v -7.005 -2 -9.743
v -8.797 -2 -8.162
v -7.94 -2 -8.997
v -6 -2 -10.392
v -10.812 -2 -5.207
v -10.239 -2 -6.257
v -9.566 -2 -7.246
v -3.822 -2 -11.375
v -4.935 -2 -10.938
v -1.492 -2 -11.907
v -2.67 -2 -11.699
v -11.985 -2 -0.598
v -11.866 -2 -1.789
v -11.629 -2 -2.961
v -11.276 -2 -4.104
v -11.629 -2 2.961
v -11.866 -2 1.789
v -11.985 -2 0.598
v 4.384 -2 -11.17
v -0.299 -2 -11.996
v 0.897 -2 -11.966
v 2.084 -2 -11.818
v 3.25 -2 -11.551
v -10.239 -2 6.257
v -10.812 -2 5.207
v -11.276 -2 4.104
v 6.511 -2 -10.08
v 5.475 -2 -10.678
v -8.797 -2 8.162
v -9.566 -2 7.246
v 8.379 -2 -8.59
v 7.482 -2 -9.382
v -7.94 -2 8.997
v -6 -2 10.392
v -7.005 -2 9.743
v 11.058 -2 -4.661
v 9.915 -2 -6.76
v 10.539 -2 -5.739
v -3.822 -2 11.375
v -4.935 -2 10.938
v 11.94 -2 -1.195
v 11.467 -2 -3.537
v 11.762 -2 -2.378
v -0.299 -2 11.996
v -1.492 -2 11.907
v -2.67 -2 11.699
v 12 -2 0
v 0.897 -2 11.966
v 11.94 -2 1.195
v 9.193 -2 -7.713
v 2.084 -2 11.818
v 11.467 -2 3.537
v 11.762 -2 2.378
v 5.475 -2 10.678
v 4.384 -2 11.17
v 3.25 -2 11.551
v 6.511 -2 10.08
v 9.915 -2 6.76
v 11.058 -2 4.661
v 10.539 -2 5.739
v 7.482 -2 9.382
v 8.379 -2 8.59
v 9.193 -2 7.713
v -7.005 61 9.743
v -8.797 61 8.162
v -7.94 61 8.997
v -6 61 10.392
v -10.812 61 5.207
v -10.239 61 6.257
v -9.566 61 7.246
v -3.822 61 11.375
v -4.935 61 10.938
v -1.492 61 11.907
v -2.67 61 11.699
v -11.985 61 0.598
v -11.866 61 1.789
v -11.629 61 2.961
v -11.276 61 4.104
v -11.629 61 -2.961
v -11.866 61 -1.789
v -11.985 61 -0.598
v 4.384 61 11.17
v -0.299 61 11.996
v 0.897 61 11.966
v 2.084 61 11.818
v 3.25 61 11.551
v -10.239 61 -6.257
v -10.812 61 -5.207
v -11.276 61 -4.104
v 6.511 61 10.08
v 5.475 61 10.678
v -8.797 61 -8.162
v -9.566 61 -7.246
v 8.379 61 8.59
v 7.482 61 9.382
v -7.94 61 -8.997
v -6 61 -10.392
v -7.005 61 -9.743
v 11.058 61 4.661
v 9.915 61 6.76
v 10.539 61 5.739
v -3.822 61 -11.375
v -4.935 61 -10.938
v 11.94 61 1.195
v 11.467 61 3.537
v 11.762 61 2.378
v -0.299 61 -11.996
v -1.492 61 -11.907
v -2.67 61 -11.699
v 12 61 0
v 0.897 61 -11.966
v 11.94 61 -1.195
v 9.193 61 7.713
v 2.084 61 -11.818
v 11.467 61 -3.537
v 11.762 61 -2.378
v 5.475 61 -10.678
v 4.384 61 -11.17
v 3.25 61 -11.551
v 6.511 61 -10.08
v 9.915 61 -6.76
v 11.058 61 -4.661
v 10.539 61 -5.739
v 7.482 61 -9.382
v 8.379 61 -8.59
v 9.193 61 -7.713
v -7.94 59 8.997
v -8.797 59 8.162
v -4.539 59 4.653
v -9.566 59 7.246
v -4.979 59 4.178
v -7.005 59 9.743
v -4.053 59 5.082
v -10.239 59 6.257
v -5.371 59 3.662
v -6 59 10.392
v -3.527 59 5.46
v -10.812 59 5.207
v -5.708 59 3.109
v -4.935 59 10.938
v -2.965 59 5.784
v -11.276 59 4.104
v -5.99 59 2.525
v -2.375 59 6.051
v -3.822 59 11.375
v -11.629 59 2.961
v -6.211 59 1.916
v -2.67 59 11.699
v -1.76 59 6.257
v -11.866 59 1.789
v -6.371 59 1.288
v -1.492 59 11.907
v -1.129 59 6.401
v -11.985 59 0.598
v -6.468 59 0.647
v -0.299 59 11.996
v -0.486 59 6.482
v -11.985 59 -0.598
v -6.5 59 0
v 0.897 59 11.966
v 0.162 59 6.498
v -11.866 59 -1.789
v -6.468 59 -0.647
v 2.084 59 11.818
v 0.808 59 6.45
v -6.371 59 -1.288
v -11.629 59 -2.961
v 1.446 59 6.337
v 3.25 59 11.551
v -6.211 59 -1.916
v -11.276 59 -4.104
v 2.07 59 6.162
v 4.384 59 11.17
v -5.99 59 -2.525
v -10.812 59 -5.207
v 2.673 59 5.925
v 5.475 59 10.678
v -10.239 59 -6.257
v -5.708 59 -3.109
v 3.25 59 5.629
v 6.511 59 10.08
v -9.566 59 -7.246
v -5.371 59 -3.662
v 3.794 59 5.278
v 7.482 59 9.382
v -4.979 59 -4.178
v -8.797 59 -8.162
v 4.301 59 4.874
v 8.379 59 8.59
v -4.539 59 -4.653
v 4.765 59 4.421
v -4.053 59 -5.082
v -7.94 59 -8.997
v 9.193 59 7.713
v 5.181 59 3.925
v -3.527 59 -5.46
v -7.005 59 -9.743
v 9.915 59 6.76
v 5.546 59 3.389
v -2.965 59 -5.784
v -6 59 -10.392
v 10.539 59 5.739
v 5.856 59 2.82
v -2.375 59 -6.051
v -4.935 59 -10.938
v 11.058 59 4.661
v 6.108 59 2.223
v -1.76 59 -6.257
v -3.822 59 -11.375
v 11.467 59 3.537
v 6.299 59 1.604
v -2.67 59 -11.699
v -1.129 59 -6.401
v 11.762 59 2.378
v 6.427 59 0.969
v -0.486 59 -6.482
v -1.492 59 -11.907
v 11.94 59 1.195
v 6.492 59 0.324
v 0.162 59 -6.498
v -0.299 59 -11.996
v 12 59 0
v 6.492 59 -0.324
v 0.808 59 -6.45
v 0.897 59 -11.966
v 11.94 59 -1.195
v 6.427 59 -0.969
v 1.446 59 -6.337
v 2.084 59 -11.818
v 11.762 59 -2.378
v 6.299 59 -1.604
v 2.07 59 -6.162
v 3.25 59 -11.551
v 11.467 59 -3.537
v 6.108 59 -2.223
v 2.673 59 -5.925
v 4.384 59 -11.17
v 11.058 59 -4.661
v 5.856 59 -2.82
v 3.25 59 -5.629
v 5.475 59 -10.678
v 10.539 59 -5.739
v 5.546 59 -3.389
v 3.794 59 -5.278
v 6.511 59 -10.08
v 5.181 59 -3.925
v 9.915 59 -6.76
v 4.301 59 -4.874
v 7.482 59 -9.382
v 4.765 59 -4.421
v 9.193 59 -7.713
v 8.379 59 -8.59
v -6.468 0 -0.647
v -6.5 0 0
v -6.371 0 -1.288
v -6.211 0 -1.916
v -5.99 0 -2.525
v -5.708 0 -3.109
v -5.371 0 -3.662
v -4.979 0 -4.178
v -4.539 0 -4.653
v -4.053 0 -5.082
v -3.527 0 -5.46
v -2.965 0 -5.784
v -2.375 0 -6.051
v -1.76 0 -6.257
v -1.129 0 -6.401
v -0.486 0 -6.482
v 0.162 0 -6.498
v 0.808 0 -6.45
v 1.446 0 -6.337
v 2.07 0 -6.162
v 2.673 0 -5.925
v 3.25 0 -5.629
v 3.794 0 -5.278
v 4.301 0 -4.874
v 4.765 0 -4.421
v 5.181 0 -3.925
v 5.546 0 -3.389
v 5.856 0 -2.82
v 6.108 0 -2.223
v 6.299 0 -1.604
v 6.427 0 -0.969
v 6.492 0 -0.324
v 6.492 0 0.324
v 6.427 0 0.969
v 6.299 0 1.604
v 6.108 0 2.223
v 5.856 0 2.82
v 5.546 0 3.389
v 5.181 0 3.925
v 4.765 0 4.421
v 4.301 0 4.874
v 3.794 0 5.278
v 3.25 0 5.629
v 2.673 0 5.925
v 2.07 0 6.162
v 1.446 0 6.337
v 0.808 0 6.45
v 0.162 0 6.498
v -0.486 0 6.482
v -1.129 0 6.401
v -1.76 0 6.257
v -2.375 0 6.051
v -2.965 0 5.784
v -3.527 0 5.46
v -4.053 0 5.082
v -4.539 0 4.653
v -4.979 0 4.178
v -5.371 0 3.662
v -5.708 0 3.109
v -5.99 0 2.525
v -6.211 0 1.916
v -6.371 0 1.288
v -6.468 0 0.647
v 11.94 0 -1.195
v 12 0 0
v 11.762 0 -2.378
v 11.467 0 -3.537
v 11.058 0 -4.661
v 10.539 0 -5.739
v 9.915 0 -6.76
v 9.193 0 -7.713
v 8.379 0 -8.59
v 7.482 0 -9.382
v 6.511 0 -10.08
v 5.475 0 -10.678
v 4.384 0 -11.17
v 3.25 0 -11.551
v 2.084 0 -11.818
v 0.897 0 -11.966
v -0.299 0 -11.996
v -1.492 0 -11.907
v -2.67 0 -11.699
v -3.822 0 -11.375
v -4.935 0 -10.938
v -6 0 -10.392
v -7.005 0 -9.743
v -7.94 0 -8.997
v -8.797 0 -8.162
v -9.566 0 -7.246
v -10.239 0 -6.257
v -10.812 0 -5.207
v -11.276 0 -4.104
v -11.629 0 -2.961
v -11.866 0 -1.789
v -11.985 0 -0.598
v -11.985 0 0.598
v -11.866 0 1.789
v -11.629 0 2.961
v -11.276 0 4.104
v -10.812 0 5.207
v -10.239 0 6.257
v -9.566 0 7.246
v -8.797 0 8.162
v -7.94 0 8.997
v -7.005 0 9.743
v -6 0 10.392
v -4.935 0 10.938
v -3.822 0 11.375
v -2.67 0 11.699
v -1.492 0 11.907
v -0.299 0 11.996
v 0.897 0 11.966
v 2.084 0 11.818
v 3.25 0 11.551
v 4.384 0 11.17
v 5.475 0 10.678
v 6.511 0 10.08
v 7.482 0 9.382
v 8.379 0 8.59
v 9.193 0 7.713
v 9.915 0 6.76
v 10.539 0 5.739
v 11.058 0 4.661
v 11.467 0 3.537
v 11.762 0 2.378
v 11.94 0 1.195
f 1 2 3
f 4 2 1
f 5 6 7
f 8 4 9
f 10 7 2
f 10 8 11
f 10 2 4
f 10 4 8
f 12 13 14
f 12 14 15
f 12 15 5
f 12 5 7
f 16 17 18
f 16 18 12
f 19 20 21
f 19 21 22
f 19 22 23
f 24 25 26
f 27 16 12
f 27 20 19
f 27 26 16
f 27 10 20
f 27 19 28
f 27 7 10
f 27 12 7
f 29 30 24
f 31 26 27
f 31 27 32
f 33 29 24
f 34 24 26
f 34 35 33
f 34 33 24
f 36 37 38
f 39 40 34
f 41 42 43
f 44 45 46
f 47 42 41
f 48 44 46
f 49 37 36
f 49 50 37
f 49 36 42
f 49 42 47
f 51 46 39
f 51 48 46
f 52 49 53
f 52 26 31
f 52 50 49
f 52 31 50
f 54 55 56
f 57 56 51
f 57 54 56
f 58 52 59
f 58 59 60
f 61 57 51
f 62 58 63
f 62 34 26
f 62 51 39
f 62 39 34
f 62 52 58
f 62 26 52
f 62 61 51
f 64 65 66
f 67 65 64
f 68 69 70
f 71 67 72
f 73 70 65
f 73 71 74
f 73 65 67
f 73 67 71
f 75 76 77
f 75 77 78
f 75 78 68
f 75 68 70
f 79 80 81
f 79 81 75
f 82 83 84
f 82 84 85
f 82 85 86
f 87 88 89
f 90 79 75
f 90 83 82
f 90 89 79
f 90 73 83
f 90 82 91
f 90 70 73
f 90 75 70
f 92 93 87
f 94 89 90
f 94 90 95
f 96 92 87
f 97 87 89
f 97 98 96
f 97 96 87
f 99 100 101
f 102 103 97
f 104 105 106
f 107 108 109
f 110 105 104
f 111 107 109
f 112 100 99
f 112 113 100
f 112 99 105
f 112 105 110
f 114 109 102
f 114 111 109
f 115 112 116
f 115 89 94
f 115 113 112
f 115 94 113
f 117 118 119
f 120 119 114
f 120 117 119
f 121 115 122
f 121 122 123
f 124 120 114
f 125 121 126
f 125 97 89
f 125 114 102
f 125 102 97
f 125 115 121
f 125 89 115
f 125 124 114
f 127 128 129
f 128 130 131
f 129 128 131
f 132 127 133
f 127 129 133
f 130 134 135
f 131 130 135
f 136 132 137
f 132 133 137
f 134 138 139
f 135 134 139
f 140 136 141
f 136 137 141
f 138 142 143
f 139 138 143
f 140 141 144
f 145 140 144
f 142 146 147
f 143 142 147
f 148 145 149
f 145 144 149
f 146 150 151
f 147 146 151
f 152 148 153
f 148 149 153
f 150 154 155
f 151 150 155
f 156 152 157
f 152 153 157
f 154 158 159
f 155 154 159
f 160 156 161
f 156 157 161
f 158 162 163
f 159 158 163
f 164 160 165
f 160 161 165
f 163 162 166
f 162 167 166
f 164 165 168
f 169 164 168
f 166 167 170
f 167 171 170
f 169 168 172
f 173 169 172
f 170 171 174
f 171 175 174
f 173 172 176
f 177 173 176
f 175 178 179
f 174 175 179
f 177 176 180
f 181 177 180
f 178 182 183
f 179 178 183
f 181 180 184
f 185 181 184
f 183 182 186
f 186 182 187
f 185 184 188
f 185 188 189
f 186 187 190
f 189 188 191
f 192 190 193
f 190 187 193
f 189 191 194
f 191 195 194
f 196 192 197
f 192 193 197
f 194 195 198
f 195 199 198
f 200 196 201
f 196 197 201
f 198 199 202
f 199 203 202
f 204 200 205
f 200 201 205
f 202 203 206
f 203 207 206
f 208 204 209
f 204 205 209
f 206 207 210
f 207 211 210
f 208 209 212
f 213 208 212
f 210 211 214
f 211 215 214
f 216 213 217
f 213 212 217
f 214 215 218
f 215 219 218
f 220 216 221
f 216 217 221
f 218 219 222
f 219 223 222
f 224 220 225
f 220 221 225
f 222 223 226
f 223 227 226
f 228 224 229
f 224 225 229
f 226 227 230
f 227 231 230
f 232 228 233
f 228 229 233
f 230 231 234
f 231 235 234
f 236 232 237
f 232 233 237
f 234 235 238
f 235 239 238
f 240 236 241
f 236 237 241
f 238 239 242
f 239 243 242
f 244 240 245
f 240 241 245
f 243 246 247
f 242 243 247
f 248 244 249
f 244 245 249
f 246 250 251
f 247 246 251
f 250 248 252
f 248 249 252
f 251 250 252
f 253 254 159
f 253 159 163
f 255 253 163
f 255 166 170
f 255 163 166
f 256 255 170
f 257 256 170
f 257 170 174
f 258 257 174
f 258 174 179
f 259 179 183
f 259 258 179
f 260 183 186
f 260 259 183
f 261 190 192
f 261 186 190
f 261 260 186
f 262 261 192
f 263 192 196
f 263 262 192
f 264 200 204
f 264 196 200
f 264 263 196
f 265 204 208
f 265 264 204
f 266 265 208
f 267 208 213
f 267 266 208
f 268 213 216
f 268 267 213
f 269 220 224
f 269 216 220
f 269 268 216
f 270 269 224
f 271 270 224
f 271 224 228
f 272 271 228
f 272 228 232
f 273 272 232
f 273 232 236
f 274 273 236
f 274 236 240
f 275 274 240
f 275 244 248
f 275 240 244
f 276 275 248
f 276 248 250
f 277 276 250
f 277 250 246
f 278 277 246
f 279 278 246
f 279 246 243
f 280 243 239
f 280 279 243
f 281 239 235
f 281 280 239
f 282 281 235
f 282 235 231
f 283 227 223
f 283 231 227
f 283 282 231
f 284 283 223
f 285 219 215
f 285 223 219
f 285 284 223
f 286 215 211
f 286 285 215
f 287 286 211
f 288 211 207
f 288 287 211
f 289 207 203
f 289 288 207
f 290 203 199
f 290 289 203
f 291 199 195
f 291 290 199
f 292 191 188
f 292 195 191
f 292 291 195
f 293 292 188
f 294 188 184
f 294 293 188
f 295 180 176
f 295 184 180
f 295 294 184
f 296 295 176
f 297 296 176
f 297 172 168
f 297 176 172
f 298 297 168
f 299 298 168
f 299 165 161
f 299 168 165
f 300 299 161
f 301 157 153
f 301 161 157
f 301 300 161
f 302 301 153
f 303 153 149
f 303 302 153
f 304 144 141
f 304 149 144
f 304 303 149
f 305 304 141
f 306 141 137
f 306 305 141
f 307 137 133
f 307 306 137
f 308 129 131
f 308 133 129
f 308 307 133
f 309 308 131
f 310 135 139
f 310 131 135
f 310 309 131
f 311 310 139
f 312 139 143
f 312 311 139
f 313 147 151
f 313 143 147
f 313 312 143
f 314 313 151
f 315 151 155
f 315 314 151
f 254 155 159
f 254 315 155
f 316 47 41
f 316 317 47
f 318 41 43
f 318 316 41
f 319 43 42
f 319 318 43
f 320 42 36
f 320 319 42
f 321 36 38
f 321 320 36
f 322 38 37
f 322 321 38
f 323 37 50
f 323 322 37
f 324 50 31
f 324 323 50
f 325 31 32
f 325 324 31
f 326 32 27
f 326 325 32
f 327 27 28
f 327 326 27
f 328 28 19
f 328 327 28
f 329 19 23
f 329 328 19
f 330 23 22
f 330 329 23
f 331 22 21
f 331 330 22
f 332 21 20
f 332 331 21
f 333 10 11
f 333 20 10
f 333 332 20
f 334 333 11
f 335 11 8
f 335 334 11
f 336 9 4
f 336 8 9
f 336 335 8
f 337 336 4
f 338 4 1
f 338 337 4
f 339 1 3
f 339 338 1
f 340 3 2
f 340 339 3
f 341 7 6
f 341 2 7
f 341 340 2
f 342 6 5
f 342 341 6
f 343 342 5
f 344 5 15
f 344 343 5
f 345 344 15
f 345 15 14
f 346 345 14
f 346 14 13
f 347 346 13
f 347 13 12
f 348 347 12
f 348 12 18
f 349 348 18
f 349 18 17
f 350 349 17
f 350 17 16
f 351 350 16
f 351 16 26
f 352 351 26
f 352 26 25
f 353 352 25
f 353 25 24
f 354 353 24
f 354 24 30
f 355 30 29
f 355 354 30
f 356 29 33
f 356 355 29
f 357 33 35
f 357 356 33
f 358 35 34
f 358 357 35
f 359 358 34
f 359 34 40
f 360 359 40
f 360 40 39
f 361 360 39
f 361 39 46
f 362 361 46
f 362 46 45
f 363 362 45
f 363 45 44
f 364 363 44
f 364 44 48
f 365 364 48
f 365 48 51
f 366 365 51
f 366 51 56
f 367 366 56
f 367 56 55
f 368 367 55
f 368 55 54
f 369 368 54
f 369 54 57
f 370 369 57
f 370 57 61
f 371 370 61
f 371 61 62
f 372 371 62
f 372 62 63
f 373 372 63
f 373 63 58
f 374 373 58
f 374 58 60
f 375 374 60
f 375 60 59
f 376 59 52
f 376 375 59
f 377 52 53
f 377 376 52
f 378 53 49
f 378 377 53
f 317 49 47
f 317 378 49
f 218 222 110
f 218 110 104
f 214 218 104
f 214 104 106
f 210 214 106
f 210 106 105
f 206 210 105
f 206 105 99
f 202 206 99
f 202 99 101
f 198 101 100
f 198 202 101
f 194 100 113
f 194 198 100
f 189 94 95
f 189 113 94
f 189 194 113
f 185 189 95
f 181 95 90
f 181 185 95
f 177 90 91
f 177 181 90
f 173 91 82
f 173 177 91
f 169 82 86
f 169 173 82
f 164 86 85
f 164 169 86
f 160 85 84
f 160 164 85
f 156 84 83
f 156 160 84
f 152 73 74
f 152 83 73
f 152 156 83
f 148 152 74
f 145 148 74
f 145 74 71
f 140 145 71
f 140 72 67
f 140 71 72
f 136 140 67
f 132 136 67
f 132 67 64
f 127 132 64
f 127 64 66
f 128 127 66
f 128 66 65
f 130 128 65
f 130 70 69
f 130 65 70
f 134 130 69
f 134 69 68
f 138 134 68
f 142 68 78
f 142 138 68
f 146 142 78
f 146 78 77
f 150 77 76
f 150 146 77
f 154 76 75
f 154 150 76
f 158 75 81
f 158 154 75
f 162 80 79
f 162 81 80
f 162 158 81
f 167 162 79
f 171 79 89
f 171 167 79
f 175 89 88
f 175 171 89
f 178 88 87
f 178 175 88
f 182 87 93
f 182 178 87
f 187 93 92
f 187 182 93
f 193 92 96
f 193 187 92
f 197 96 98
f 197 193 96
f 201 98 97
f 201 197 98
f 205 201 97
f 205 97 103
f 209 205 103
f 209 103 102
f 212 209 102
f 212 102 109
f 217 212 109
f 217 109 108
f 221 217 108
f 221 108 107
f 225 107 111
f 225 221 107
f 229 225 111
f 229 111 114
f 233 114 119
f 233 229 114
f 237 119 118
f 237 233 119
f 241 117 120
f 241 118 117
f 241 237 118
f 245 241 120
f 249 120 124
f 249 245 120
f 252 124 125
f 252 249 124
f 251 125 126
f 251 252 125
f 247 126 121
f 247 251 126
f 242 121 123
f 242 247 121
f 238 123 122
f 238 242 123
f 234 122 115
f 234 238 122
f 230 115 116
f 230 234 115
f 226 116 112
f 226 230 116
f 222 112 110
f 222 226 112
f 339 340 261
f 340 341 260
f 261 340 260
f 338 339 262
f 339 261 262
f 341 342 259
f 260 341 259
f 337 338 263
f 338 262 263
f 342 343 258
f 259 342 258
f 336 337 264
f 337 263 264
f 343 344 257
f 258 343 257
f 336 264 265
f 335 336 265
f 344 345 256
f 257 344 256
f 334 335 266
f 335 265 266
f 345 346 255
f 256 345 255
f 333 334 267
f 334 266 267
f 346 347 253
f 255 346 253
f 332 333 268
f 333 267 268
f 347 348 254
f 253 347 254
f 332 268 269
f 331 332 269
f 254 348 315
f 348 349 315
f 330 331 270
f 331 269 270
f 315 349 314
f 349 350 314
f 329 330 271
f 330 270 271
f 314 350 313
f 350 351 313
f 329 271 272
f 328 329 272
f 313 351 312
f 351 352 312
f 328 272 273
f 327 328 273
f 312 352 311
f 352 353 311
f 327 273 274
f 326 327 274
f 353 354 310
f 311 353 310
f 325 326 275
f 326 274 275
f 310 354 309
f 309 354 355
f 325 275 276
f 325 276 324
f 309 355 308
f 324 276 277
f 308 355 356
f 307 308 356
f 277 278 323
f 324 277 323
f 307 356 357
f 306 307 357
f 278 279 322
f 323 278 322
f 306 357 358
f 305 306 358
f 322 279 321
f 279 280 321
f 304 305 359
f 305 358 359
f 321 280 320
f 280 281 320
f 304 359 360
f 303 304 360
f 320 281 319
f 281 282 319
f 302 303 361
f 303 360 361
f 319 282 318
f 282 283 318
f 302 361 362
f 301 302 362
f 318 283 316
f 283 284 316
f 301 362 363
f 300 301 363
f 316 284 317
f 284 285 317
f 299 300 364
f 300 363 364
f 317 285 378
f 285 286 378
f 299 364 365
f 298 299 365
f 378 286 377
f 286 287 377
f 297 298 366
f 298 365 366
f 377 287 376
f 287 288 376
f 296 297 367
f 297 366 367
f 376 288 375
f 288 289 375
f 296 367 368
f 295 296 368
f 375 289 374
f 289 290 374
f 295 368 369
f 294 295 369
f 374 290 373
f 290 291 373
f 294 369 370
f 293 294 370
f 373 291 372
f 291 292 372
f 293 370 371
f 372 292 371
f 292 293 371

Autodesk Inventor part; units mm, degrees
ref_plane "YZ Plane" through (0, 0, 0) normal (1, 0, 0) x (0, 1, 0)
ref_plane "XZ Plane" through (0, 0, 0) normal (0, 1, 0) x (-1, 0, 0)
ref_plane "XY Plane" through (0, 0, 0) normal (0, 0, 1) x (1, 0, 0)
sketch "Sketch1" plane through (0, 0, 0) normal (0, 1, 0) x (-1, 0, 0)
  circle A0 centre (0, 0) radius 6.5
  dimension "d0" = 13
extrude "Extrusion1" add sketch "Sketch1" along normal blind 59
sketch "Sketch2" plane through (0, 59, 0) normal (0, 1, 0) x (1, 0, 0)
  circle A0 centre (0, 0) radius 6.5 projected
  circle A1 centre (0, 0) radius 12
  dimension "d3" = 24
extrude "Extrusion2" add sketch "Sketch2" along normal blind 2 contours A0 | A1
sketch "Sketch3" plane through (0, 0, 0) normal (0, -1, 0) x (1, 0, 0)
  circle A0 centre (0, 0) radius 6.5 projected
  circle A1 centre (0, 0) radius 12
  dimension "d6" = 24
extrude "Extrusion3" add sketch "Sketch3" along normal blind 2 contours A0 | A1
properties part number "Middle Arm Linkage"
